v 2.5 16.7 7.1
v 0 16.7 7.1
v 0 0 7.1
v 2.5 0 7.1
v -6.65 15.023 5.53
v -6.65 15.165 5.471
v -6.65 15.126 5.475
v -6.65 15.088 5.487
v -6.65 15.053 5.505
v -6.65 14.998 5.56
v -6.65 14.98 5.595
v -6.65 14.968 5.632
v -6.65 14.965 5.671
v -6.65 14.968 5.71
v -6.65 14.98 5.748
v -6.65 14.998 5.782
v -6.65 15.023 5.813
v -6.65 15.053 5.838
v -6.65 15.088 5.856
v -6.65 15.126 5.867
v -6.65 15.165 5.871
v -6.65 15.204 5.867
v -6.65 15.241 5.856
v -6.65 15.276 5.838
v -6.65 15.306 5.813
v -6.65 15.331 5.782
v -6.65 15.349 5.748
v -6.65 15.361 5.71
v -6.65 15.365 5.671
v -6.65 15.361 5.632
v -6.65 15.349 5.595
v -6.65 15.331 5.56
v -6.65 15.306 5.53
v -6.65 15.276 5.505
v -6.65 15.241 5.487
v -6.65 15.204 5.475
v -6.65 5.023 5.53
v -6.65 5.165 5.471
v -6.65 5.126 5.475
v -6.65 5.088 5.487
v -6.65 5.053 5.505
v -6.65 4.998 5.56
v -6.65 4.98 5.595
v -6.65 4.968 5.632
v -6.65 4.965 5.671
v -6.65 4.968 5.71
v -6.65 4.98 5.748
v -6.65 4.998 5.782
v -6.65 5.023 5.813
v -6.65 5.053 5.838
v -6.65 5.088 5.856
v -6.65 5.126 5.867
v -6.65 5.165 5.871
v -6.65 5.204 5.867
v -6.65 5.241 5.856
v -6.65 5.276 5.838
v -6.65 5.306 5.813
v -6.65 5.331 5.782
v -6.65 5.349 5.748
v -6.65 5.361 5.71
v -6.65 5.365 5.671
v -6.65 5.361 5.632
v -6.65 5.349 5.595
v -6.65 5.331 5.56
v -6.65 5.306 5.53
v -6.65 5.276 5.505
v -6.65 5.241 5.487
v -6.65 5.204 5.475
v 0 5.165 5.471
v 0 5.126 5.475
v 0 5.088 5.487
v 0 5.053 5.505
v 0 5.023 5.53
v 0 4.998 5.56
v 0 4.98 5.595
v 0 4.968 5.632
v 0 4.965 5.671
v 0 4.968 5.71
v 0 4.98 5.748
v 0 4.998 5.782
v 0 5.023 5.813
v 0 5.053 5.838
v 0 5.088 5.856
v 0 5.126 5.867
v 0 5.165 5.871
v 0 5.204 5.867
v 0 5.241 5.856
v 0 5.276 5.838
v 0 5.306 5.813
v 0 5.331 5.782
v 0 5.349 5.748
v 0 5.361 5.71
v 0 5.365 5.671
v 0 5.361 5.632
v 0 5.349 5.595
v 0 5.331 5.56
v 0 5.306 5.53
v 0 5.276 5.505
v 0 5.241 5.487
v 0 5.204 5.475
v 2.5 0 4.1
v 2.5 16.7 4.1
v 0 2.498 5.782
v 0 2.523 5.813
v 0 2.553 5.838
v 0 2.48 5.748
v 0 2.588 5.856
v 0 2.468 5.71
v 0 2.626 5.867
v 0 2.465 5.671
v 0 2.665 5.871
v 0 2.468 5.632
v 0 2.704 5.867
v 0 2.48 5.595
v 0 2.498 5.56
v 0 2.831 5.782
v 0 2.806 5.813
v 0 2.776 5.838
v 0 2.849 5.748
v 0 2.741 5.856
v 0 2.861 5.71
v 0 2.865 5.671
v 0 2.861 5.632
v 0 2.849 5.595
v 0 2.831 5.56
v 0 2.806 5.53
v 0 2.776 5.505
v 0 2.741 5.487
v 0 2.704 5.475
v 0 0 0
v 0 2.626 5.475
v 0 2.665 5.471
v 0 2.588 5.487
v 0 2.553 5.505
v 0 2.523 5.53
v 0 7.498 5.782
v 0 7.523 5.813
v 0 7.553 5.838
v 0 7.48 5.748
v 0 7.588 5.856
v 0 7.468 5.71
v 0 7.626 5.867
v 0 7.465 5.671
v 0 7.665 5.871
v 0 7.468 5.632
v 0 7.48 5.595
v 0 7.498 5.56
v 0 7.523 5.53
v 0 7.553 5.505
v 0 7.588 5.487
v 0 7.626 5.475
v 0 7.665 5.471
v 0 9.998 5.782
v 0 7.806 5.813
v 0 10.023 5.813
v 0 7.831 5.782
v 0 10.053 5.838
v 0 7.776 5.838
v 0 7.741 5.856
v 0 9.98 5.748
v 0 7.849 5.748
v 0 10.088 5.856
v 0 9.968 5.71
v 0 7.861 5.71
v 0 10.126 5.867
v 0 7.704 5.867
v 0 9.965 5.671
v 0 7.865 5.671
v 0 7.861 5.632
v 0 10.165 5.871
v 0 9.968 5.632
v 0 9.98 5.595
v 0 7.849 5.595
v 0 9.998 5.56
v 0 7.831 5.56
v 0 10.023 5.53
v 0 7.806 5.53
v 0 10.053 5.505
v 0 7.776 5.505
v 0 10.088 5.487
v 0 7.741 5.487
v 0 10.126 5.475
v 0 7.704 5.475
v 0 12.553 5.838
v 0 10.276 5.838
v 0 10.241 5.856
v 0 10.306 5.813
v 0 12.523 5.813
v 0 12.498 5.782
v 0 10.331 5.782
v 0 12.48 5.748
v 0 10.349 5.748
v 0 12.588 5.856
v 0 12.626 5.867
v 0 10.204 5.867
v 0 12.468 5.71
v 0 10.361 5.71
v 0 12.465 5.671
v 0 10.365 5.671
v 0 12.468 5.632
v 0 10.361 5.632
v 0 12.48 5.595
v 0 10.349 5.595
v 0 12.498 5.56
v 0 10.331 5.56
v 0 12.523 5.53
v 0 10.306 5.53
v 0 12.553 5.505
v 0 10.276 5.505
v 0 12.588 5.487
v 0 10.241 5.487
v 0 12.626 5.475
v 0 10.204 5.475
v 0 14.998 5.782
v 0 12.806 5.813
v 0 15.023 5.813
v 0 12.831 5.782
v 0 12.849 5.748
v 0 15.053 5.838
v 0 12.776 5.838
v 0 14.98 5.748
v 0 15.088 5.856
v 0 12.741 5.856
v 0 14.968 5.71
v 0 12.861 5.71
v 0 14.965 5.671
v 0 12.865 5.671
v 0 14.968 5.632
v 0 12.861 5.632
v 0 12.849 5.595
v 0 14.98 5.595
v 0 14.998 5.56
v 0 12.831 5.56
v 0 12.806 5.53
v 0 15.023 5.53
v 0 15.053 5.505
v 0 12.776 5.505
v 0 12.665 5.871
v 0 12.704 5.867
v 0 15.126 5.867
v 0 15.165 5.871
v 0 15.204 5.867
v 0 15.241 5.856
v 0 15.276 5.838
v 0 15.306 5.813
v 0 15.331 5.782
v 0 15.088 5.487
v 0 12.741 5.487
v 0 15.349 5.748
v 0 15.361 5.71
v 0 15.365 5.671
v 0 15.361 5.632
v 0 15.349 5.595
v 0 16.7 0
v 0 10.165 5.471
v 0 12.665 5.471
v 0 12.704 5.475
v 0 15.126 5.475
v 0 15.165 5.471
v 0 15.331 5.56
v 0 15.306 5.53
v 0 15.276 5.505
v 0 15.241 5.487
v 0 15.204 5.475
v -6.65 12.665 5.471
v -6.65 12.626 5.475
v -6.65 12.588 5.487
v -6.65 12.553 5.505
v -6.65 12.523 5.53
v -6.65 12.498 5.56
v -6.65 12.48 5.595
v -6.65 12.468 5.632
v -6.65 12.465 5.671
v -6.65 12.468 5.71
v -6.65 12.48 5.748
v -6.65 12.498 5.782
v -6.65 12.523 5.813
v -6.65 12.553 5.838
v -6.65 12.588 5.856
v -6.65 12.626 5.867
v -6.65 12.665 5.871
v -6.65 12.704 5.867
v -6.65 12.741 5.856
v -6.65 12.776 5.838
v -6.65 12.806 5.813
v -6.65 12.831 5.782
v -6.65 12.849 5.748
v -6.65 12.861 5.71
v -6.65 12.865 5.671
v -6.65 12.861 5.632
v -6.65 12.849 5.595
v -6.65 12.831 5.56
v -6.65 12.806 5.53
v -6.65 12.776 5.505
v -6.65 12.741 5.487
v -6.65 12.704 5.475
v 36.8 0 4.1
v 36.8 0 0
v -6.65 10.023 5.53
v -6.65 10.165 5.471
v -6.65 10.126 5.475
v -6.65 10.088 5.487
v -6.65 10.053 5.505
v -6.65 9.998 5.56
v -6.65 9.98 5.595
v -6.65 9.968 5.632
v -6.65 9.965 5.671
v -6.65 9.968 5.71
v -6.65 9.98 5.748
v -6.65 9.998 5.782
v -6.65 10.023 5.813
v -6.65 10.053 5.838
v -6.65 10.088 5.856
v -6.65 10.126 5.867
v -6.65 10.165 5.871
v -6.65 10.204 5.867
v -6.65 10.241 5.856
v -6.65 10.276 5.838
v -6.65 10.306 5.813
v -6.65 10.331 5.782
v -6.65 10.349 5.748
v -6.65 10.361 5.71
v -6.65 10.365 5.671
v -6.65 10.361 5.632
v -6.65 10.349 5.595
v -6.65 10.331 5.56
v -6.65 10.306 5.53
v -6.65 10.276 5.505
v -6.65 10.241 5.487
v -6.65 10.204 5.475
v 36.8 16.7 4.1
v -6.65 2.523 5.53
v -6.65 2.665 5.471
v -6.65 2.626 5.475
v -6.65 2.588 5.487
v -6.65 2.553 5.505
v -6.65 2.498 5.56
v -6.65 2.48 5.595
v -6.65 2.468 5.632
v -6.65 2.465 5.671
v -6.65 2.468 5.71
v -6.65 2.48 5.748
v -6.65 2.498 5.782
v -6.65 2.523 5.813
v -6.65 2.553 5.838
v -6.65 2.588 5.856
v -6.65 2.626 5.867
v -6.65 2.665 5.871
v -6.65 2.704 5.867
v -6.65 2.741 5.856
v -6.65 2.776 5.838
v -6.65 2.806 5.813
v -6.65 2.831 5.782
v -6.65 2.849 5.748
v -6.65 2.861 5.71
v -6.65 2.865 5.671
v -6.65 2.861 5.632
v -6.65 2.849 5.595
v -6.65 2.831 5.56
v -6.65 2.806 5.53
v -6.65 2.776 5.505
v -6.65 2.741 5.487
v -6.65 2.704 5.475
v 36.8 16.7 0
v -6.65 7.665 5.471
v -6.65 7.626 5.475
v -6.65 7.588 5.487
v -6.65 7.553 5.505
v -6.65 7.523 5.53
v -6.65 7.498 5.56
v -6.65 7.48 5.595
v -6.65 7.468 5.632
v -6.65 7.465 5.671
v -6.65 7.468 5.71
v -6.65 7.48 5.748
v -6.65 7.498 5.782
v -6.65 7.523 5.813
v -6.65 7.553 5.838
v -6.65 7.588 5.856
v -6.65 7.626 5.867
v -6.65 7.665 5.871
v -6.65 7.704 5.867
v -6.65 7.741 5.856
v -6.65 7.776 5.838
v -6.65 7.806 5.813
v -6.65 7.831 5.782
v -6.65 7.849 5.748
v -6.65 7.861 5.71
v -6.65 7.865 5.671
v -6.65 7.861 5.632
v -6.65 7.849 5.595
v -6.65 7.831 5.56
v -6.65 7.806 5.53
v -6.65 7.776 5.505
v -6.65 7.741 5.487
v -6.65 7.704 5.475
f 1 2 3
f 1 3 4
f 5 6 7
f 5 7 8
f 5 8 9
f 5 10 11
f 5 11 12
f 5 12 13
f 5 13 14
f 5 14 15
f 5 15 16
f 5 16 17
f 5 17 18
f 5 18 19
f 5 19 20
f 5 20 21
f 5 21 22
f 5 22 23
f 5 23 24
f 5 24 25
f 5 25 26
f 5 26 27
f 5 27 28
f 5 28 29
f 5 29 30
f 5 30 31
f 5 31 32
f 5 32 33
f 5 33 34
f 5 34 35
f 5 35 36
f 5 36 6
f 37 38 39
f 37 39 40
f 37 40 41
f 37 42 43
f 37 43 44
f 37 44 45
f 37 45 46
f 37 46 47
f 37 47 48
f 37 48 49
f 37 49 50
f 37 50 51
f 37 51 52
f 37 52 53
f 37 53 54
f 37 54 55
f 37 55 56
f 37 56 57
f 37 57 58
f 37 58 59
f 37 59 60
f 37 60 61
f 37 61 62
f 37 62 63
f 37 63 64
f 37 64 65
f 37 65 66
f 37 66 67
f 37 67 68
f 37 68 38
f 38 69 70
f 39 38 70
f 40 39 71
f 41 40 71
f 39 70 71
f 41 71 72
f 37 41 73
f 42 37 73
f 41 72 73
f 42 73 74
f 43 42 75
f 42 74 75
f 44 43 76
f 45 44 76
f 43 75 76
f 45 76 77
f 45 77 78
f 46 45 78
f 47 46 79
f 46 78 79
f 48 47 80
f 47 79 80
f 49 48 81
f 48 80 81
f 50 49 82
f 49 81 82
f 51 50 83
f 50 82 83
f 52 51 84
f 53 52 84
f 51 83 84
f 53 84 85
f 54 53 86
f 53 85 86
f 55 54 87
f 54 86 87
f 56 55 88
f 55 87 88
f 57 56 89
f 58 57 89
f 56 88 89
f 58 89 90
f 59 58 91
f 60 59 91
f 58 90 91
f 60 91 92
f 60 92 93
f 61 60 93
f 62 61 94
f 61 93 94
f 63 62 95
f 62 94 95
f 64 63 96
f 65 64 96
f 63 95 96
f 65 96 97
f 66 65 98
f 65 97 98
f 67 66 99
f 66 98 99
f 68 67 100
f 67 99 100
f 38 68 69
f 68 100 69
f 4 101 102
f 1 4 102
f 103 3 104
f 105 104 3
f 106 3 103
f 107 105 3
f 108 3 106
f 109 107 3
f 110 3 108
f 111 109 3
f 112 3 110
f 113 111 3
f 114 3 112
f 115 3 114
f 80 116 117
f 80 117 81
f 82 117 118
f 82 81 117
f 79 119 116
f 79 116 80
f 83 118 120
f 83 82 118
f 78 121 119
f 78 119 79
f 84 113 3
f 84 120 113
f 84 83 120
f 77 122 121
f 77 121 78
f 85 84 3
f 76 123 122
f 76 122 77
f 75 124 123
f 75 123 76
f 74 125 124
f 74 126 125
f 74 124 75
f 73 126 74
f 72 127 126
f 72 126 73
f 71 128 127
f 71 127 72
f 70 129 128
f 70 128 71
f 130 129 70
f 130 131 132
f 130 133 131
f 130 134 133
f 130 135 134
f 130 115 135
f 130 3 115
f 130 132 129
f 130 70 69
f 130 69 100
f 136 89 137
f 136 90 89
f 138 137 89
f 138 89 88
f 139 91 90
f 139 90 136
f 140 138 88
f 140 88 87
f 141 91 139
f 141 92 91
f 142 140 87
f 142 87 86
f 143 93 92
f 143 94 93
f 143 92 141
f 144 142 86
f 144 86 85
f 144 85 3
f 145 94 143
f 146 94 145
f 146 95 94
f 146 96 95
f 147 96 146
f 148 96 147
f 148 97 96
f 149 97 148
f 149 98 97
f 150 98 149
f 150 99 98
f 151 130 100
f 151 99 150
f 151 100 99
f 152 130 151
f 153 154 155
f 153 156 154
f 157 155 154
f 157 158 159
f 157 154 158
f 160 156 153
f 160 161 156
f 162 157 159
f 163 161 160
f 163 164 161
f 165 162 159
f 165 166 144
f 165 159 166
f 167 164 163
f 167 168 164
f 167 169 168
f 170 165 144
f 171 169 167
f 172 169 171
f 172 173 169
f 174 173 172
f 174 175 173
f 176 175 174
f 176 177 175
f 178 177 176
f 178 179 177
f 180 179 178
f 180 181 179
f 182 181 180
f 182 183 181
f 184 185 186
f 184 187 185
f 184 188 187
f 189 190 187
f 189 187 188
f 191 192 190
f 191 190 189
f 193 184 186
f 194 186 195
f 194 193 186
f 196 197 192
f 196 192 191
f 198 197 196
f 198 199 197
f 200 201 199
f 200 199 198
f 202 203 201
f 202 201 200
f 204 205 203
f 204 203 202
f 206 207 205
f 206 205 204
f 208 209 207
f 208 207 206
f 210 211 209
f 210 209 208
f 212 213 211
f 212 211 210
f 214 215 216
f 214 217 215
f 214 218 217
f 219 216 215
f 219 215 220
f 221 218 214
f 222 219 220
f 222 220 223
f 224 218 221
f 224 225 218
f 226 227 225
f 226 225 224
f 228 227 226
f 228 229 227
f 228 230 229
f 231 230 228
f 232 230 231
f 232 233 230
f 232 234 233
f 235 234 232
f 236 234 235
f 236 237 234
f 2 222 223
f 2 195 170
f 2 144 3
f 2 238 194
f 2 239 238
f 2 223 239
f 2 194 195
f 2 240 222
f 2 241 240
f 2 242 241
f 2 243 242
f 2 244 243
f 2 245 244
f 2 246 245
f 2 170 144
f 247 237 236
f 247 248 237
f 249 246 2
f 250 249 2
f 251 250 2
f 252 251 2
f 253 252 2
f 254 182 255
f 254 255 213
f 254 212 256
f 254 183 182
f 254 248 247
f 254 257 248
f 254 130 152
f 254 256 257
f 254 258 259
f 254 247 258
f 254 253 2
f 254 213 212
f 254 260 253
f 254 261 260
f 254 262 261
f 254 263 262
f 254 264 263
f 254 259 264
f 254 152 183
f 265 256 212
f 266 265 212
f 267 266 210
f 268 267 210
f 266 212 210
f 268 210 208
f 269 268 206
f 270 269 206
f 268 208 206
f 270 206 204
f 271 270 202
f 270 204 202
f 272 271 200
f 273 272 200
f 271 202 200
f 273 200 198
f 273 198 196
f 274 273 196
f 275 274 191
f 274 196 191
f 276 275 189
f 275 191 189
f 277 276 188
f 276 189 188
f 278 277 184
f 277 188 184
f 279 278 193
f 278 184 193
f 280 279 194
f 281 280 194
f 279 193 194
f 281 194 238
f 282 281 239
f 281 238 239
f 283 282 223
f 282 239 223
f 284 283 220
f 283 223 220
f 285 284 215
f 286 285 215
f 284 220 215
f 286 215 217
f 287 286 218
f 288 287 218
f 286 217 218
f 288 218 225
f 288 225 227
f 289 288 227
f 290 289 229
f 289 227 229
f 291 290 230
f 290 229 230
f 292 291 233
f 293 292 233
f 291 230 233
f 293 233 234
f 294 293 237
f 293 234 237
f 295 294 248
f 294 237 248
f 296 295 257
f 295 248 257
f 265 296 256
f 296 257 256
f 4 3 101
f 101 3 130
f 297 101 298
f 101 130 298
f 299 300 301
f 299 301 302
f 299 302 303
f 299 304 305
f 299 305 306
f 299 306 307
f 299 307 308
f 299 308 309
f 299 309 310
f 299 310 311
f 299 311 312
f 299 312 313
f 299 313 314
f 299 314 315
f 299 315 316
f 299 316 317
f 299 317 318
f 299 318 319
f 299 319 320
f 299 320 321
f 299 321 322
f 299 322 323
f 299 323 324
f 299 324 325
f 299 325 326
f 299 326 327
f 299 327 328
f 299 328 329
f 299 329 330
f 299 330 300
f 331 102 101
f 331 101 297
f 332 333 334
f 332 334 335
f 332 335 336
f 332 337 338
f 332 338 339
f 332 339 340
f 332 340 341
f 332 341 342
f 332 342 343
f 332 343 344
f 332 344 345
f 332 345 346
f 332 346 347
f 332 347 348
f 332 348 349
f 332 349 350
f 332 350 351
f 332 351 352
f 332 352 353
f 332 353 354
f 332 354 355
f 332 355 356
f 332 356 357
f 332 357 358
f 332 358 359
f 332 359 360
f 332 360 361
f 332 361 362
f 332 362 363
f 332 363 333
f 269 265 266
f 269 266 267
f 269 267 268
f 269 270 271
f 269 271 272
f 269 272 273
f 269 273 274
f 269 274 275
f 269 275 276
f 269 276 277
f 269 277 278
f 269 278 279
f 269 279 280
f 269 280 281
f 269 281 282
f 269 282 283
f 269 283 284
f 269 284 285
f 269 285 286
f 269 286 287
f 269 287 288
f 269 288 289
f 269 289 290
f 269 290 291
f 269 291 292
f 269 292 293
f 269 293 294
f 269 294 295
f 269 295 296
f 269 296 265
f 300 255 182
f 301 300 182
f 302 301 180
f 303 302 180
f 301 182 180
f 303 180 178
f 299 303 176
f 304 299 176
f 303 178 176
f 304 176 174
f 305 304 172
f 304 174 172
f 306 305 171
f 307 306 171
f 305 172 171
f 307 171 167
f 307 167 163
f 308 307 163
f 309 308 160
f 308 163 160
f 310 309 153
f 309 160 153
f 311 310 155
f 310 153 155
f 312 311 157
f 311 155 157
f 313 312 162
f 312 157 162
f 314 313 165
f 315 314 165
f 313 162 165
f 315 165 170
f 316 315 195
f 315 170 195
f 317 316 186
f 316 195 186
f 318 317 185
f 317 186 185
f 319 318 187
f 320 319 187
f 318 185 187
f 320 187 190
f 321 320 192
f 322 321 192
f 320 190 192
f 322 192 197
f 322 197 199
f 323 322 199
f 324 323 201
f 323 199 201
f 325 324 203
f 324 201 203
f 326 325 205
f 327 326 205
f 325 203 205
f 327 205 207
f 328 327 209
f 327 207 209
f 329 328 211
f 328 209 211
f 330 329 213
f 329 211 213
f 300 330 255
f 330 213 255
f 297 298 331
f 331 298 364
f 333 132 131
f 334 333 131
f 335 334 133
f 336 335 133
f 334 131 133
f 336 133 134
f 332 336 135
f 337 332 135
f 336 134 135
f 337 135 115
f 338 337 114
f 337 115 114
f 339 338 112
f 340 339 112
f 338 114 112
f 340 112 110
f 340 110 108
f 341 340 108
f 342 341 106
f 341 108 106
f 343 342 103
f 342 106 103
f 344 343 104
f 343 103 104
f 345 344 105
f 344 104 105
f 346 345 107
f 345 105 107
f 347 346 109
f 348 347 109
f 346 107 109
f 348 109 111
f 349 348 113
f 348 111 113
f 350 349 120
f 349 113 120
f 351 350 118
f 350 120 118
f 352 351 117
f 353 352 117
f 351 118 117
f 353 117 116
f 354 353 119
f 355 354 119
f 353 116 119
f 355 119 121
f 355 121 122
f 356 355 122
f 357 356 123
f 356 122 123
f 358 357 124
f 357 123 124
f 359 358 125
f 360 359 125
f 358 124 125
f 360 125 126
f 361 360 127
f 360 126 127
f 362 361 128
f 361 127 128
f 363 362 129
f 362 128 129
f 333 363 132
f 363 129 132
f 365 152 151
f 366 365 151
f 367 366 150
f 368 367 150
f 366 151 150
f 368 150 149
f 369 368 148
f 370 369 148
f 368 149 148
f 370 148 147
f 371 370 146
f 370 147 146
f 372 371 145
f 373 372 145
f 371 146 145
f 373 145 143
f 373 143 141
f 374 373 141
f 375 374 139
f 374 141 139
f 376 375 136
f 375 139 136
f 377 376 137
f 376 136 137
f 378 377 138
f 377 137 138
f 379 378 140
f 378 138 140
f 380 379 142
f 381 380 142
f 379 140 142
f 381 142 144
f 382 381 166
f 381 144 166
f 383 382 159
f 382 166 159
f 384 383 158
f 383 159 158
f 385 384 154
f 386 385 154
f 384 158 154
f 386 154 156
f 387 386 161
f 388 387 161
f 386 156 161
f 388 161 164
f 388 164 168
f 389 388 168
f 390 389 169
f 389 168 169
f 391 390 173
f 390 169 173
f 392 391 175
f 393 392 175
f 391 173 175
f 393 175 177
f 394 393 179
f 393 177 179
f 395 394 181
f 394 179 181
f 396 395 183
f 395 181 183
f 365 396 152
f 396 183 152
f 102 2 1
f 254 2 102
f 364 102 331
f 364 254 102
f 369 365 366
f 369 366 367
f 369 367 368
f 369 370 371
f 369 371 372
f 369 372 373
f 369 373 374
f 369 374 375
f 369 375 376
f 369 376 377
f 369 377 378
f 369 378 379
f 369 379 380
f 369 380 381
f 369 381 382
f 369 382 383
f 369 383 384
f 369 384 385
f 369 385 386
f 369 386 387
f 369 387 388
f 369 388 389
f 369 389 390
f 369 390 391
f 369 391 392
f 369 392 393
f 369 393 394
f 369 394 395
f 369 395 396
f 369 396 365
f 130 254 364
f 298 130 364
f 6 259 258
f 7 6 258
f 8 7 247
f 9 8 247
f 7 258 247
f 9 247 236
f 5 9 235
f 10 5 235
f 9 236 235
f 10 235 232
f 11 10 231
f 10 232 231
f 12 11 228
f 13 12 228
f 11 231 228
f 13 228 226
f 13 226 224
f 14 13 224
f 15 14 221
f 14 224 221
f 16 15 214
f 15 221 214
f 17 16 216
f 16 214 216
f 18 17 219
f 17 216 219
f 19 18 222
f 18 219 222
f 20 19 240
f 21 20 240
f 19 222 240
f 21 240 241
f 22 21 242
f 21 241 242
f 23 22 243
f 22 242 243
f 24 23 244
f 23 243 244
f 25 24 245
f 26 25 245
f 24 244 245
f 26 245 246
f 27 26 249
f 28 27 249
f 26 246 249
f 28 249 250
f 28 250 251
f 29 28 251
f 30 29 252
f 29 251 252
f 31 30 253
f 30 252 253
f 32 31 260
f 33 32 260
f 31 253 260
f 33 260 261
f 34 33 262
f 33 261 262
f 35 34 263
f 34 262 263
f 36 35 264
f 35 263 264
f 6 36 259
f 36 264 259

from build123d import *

# Parameters (mm, degrees)
SKETCH_1_W      = 36.8
SKETCH_1_H      = 16.7
EXTRUDE_1_DEPTH = 4.1
SKETCH_2_W      = 2.5
SKETCH_2_H      = 16.7
EXTRUDE_2_DEPTH = 3
SKETCH_3_R      = 0.2
EXTRUDE_3_DEPTH = 6.65


with BuildPart() as part:
    # 草图1 → 凸台-拉伸1 (new body)
    with BuildSketch(Plane.XY):
        with Locations((18.4, 8.35)):
            Rectangle(SKETCH_1_W, SKETCH_1_H)
    extrude(amount=EXTRUDE_1_DEPTH)

    # 草图2 → 凸台-拉伸2 (add)
    with BuildSketch(Plane.XY.offset(4.1)):
        with Locations((1.25, 8.35)):
            Rectangle(SKETCH_2_W, SKETCH_2_H)
    extrude(amount=EXTRUDE_2_DEPTH)

    # 草图3 → 凸台-拉伸3 (add)
    with BuildSketch(Plane.ZY):
        with Locations(Location((5.671300253, 15.164518481, 0), (0, 0, 180))):
            Circle(SKETCH_3_R)
        with Locations(Location((5.671300253, 12.664518481, 0), (0, 0, 180))):
            Circle(SKETCH_3_R)
        with Locations(Location((5.671300253, 10.164518481, 0), (0, 0, 180))):
            Circle(SKETCH_3_R)
        with Locations(Location((5.671300253, 7.664518481, 0), (0, 0, 180))):
            Circle(SKETCH_3_R)
        with Locations(Location((5.671300253, 5.164518481, 0), (0, 0, 180))):
            Circle(SKETCH_3_R)
        with Locations(Location((5.671300253, 2.664518481, 0), (0, 0, 180))):
            Circle(SKETCH_3_R)
    extrude(amount=EXTRUDE_3_DEPTH)


solid = part.part
